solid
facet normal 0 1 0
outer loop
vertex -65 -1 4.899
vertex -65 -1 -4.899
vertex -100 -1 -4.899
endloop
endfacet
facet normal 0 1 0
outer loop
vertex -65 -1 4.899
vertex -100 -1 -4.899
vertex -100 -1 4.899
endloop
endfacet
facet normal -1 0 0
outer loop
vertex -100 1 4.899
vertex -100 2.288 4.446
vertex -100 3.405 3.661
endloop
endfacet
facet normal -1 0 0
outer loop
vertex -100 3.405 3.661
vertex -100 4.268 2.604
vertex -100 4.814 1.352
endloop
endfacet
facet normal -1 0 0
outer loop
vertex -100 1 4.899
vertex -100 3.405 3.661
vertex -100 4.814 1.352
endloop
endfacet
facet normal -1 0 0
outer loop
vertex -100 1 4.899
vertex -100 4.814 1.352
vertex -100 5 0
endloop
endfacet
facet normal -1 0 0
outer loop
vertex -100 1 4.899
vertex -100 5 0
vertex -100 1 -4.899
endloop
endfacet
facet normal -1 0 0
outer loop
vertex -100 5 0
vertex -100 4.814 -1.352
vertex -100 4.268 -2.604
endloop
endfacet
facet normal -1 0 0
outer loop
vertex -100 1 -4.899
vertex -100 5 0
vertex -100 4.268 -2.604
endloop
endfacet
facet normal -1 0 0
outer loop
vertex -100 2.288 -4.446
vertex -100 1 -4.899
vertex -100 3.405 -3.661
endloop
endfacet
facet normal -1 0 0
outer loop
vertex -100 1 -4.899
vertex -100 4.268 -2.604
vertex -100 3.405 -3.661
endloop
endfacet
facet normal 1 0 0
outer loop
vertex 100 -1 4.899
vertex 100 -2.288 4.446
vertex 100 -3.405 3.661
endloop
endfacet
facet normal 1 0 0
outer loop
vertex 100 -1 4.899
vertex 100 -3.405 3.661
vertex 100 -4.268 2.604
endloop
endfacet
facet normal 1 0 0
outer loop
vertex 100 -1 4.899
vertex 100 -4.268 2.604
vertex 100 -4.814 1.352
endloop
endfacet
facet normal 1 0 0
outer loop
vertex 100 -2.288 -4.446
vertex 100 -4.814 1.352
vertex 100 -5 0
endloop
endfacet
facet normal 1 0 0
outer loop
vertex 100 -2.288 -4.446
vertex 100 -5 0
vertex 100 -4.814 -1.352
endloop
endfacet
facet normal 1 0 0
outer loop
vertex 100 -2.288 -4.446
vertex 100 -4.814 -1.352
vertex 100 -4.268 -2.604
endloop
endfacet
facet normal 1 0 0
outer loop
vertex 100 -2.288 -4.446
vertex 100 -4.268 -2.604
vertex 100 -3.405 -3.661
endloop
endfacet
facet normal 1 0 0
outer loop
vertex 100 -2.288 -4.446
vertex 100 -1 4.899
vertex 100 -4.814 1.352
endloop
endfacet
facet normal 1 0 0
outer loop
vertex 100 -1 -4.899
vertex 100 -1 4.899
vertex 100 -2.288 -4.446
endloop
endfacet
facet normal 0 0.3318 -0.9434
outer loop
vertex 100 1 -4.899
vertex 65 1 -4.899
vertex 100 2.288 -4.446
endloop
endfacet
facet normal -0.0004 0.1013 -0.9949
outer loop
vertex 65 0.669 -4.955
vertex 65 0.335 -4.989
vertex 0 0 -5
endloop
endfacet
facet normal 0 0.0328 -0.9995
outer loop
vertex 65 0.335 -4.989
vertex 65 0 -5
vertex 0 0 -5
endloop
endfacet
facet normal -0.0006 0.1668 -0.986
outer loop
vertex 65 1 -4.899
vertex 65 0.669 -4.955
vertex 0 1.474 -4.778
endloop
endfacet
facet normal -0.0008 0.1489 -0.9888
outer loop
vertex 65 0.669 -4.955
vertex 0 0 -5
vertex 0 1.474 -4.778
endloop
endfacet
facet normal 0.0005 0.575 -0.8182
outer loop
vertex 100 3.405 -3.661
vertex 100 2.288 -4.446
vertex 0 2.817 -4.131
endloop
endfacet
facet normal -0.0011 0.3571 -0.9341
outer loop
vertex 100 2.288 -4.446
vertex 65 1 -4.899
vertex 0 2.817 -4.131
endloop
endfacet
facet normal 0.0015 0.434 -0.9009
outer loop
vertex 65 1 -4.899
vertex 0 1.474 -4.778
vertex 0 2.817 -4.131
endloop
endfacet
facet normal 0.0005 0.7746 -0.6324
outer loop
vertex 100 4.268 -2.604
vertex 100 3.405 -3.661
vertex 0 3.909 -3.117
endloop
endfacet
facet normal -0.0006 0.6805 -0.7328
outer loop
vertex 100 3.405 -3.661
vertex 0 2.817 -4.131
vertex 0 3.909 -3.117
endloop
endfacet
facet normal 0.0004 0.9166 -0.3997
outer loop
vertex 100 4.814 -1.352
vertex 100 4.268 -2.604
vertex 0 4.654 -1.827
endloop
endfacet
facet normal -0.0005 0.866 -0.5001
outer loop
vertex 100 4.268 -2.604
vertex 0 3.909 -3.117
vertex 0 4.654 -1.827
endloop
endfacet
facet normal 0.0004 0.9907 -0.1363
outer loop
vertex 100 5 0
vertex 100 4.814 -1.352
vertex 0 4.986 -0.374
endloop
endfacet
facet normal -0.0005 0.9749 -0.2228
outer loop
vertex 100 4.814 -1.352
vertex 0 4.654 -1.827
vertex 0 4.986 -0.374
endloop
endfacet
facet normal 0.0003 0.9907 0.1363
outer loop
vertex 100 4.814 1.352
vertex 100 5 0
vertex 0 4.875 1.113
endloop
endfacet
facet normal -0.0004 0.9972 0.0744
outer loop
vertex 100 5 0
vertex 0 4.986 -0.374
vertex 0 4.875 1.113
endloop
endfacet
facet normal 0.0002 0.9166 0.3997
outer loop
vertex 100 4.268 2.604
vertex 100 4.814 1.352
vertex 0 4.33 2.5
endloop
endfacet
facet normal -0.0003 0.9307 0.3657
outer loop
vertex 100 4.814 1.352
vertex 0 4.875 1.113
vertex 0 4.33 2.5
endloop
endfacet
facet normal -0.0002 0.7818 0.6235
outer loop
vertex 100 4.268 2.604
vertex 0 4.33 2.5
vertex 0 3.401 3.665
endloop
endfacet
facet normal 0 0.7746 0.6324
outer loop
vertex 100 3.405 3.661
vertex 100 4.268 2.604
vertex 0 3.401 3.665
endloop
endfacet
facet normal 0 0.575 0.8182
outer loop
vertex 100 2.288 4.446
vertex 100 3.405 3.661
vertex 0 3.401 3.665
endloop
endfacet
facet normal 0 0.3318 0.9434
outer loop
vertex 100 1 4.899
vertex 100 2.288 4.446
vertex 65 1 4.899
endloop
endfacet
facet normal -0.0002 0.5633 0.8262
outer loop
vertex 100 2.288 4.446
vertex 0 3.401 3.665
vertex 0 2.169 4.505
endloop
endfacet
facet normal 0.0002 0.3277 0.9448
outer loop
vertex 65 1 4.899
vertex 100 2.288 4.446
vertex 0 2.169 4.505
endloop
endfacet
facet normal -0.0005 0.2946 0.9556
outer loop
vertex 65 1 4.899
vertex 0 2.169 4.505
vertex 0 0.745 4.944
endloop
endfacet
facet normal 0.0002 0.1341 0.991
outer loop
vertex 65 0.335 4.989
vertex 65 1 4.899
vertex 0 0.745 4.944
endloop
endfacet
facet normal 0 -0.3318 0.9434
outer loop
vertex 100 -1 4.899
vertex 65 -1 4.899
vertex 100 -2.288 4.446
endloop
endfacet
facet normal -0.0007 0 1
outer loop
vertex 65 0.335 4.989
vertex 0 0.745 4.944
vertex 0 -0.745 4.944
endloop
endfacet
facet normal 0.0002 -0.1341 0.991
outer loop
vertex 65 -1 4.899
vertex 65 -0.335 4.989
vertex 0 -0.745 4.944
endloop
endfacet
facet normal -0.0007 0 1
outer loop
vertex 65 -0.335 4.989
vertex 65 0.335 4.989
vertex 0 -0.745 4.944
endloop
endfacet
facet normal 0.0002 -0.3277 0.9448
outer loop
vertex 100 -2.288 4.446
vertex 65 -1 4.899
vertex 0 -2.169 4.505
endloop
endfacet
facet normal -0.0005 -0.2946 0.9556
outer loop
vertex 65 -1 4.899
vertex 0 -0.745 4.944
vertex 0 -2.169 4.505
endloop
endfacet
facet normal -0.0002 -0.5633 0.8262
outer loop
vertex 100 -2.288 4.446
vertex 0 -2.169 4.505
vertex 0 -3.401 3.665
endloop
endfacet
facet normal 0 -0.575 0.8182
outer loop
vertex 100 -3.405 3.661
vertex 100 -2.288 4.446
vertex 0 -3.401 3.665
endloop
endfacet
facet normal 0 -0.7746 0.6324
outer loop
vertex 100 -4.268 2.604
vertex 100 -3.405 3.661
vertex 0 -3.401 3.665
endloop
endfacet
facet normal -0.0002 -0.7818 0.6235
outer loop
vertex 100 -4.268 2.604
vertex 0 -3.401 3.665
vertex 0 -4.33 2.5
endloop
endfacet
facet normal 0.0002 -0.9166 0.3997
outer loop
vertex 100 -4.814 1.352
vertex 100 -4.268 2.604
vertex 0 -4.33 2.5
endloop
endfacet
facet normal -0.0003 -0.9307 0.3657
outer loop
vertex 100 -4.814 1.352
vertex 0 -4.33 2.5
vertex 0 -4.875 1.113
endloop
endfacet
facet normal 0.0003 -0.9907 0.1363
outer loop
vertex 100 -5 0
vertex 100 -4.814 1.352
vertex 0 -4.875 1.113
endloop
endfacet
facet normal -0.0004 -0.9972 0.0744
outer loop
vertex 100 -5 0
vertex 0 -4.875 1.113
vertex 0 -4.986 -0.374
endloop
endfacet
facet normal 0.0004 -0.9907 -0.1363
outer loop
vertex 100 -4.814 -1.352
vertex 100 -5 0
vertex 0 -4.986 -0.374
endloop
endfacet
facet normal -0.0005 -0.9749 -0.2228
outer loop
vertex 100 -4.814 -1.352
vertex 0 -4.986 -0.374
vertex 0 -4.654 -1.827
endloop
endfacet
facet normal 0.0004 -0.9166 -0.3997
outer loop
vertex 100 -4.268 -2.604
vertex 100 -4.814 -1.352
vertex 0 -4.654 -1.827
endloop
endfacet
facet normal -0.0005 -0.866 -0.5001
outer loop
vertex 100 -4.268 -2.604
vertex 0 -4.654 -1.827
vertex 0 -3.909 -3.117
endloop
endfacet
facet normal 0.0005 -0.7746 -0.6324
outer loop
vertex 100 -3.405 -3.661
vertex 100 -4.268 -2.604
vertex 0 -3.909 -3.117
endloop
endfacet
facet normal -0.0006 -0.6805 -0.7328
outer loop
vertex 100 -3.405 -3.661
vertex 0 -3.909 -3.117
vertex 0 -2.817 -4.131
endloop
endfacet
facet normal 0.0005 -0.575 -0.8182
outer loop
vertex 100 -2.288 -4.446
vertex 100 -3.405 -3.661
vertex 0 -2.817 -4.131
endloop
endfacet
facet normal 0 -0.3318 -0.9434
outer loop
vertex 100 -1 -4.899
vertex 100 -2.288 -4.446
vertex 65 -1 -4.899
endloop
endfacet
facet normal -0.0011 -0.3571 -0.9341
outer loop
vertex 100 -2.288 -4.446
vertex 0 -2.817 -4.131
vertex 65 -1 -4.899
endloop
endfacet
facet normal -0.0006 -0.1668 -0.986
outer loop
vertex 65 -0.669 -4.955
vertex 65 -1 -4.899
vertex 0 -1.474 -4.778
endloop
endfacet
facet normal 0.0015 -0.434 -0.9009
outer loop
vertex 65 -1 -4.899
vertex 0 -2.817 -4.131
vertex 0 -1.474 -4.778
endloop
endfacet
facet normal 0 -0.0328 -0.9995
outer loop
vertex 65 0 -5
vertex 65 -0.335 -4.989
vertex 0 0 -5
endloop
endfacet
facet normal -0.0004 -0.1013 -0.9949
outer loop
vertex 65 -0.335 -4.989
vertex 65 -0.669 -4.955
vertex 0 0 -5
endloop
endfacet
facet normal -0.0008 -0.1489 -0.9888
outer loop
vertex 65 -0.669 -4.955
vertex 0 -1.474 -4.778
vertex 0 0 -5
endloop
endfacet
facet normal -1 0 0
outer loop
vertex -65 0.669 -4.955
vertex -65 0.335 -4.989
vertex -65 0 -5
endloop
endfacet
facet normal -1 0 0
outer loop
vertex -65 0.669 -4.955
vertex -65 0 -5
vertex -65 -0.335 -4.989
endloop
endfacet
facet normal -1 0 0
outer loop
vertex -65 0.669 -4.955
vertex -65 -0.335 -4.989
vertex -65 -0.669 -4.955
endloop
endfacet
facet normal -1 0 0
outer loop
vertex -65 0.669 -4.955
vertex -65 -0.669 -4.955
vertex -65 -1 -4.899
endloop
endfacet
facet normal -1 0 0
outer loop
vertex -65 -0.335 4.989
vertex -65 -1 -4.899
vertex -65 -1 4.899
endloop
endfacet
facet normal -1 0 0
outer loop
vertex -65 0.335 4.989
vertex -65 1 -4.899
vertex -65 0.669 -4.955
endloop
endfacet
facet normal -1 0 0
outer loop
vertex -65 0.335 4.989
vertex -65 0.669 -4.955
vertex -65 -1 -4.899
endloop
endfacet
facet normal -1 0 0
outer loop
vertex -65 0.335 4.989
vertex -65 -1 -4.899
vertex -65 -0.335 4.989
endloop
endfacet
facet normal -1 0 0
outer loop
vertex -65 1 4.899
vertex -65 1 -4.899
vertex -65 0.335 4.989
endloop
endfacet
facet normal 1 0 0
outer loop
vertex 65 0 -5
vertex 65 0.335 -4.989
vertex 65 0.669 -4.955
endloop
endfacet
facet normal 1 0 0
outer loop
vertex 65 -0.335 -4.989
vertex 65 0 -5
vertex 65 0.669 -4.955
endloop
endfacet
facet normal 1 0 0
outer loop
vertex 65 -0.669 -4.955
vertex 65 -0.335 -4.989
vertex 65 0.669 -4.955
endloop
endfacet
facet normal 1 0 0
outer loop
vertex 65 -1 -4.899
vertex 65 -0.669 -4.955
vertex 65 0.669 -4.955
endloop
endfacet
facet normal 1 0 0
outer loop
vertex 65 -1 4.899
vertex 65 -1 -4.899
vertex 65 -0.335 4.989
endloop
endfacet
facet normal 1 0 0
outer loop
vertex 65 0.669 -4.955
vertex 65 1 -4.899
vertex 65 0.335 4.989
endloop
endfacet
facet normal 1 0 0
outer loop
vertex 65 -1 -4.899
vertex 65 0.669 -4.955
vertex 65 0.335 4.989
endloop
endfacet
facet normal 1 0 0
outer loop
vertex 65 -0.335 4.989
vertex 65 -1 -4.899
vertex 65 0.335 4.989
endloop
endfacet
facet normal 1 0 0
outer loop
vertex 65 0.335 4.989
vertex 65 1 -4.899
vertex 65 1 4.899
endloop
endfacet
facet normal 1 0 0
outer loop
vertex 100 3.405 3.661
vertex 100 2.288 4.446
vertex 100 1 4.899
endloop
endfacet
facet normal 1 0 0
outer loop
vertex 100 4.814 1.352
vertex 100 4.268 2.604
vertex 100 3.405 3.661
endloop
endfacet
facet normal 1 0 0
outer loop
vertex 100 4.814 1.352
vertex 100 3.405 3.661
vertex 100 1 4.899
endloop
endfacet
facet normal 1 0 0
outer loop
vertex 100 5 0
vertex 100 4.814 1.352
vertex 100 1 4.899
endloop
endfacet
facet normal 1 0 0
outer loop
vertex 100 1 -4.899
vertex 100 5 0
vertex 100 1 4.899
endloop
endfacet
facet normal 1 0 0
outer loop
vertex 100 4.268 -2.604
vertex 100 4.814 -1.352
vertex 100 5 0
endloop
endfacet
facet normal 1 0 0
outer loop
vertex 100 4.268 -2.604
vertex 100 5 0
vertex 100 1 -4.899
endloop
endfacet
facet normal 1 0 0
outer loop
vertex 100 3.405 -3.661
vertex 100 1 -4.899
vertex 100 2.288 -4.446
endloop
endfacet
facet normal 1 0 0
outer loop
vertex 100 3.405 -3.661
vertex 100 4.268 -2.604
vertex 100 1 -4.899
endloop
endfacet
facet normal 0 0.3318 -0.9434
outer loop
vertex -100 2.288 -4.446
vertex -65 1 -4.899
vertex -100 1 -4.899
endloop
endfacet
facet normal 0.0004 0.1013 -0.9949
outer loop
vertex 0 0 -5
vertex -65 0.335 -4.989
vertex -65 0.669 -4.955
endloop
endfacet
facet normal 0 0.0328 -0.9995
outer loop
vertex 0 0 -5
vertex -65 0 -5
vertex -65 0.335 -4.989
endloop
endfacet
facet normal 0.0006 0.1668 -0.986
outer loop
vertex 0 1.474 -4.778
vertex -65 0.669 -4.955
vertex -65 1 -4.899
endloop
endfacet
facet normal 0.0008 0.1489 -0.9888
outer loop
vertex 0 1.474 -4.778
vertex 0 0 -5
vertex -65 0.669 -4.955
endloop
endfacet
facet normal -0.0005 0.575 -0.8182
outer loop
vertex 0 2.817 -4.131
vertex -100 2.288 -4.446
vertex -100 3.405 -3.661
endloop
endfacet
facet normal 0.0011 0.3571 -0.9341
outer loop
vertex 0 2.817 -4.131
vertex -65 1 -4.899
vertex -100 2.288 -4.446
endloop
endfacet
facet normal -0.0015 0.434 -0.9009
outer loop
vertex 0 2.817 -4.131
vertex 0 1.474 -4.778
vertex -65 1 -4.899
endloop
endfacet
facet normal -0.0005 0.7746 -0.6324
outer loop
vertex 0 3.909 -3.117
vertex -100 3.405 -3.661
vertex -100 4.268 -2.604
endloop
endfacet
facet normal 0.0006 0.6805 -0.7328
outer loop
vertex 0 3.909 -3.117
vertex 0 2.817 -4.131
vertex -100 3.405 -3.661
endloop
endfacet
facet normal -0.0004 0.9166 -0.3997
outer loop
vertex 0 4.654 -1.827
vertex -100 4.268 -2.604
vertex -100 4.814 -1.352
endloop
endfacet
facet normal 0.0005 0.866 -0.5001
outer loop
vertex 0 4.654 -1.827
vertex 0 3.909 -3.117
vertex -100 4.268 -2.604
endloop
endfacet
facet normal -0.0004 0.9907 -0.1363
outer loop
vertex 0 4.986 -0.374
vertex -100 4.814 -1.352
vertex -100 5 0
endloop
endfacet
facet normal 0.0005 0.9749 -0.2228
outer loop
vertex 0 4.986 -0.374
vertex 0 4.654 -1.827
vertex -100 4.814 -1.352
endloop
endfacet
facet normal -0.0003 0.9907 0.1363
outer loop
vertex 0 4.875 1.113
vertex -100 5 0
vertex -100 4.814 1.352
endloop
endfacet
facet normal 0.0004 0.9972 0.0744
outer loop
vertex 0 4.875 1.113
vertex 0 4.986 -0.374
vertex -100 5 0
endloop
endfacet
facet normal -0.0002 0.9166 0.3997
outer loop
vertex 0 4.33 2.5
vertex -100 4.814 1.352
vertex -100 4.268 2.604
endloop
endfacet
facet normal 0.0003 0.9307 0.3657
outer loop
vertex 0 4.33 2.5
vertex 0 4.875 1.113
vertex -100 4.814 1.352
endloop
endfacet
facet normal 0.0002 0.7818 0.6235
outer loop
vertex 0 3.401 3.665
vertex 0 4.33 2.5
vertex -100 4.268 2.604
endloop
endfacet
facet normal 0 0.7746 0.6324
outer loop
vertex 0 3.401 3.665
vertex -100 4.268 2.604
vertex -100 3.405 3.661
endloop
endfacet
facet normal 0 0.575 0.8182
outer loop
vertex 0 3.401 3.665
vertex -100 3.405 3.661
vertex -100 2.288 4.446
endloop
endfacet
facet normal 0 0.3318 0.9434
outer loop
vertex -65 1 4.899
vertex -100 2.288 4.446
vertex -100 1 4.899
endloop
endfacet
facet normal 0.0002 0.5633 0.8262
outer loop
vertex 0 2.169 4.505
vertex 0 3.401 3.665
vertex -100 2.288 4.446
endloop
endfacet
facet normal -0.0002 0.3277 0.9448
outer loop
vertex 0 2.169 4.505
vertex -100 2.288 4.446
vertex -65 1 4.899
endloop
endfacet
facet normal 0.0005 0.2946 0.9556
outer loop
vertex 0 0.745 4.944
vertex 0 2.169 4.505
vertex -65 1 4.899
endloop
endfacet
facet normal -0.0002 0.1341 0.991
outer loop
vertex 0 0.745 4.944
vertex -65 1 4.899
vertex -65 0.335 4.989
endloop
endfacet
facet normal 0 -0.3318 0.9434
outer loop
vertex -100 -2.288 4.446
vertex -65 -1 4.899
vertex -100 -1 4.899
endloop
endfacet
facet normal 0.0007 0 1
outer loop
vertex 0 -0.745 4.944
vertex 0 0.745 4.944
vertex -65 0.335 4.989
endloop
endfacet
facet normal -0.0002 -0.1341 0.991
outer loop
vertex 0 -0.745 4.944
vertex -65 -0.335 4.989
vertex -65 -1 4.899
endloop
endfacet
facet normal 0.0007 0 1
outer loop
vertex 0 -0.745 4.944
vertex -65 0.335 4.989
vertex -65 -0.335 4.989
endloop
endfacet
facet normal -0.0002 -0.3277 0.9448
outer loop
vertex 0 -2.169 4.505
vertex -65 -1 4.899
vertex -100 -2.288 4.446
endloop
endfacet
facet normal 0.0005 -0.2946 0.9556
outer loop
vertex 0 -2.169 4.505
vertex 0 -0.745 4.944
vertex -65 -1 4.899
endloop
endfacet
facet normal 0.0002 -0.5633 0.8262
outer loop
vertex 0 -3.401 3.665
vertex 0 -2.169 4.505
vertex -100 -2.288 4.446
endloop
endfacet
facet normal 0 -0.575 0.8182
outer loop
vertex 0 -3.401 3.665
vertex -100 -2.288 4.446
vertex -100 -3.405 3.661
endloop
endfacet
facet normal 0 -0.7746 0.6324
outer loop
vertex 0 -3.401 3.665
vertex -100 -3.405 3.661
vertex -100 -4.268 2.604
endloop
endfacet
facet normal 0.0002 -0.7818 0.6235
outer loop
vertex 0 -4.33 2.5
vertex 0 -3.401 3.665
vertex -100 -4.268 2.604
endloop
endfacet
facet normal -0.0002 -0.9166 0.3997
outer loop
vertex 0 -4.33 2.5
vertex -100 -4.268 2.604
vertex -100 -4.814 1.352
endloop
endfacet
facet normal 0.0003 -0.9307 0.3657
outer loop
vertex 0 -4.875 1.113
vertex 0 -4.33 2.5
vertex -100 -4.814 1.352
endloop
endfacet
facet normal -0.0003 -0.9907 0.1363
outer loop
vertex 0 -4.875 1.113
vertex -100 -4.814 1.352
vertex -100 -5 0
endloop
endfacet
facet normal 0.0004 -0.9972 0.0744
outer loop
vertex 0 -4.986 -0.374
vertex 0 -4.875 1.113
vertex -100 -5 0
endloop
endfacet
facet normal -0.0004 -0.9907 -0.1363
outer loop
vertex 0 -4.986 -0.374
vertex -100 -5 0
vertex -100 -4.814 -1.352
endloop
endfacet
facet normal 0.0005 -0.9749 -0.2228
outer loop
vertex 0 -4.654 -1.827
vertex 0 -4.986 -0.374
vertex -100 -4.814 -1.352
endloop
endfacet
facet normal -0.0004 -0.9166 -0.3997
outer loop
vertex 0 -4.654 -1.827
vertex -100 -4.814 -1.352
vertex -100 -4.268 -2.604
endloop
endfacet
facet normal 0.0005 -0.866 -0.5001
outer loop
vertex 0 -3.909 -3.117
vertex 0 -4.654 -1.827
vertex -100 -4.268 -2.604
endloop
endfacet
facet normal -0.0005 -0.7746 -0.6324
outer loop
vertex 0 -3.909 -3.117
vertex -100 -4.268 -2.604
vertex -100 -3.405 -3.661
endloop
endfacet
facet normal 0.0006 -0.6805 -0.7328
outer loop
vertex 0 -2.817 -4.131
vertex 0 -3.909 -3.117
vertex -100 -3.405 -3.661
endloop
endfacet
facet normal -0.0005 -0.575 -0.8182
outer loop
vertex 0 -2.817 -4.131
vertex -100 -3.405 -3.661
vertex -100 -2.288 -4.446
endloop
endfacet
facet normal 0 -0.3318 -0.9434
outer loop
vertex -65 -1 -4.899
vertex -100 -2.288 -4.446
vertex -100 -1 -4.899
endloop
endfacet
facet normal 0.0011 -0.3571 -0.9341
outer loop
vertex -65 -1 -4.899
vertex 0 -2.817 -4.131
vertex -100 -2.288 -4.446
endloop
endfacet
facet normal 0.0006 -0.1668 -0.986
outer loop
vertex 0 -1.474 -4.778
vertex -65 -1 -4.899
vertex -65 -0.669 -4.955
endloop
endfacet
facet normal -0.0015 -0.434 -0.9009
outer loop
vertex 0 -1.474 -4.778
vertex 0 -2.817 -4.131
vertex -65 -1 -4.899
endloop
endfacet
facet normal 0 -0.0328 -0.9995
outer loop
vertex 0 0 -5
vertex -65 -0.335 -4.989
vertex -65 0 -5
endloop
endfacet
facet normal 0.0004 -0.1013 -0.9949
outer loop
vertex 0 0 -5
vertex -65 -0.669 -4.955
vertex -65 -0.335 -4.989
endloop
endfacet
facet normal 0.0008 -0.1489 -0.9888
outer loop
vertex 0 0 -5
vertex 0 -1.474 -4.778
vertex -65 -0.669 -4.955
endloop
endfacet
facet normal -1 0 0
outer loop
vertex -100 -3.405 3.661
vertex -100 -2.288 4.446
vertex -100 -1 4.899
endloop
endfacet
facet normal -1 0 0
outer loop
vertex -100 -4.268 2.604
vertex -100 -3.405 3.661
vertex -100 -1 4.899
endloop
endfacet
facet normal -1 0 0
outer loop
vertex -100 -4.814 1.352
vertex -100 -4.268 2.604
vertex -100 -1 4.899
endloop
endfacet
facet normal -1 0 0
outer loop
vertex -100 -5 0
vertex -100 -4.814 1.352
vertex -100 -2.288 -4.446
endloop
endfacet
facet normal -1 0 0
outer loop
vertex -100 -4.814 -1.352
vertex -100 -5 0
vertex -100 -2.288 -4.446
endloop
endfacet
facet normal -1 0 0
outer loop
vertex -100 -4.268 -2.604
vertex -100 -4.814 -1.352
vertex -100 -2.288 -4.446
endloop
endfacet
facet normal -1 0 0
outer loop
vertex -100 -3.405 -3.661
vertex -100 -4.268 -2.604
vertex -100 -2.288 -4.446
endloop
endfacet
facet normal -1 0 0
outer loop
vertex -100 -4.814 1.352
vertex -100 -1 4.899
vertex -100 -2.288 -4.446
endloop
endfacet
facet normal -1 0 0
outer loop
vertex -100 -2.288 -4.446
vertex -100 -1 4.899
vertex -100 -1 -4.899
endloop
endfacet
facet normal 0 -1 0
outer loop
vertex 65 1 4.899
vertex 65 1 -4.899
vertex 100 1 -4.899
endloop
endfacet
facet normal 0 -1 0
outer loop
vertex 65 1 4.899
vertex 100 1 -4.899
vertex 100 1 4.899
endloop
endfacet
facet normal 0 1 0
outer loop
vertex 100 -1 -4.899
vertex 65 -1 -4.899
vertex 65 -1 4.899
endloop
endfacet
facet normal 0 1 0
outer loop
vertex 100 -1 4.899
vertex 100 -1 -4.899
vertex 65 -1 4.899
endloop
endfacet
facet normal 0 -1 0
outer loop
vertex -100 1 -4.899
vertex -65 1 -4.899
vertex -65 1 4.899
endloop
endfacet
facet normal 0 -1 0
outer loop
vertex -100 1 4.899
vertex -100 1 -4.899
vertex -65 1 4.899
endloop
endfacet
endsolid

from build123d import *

# Parameters (mm, degrees)
SKETCH_1_R          = 5
EXTRUDE_1_DEPTH     = 100
CUT_EXTRUDE_1_DEPTH = 35


with BuildPart() as part:
    # 草图1 → 凸台-拉伸1 (new body)
    with BuildSketch(Plane(origin=(0, 0, 0), x_dir=(0, 0, -1), z_dir=(1, 0, 0))):
        Circle(SKETCH_1_R)
    extrude(amount=EXTRUDE_1_DEPTH)

    # 草图2 → 切除-拉伸1 (cut)
    with BuildSketch(Plane(origin=(100, 0, 0), x_dir=(0, 0, -1), z_dir=(1, 0, 0))):
        Polygon((0, 1), (7.225106676, 1), (7.225106676, -1), (-6.455679515, -1), (-6.455679515, 1), align=None)
    extrude(amount=-CUT_EXTRUDE_1_DEPTH, mode=Mode.SUBTRACT)

    # 镜向1: part across plane


with BuildPart() as part_1:
    add(part.part)
    add(part.part.mirror(Plane(origin=(0, 0, 0), x_dir=(0, 0, 1), z_dir=(1, 0, 0))))


solid = part_1.part
